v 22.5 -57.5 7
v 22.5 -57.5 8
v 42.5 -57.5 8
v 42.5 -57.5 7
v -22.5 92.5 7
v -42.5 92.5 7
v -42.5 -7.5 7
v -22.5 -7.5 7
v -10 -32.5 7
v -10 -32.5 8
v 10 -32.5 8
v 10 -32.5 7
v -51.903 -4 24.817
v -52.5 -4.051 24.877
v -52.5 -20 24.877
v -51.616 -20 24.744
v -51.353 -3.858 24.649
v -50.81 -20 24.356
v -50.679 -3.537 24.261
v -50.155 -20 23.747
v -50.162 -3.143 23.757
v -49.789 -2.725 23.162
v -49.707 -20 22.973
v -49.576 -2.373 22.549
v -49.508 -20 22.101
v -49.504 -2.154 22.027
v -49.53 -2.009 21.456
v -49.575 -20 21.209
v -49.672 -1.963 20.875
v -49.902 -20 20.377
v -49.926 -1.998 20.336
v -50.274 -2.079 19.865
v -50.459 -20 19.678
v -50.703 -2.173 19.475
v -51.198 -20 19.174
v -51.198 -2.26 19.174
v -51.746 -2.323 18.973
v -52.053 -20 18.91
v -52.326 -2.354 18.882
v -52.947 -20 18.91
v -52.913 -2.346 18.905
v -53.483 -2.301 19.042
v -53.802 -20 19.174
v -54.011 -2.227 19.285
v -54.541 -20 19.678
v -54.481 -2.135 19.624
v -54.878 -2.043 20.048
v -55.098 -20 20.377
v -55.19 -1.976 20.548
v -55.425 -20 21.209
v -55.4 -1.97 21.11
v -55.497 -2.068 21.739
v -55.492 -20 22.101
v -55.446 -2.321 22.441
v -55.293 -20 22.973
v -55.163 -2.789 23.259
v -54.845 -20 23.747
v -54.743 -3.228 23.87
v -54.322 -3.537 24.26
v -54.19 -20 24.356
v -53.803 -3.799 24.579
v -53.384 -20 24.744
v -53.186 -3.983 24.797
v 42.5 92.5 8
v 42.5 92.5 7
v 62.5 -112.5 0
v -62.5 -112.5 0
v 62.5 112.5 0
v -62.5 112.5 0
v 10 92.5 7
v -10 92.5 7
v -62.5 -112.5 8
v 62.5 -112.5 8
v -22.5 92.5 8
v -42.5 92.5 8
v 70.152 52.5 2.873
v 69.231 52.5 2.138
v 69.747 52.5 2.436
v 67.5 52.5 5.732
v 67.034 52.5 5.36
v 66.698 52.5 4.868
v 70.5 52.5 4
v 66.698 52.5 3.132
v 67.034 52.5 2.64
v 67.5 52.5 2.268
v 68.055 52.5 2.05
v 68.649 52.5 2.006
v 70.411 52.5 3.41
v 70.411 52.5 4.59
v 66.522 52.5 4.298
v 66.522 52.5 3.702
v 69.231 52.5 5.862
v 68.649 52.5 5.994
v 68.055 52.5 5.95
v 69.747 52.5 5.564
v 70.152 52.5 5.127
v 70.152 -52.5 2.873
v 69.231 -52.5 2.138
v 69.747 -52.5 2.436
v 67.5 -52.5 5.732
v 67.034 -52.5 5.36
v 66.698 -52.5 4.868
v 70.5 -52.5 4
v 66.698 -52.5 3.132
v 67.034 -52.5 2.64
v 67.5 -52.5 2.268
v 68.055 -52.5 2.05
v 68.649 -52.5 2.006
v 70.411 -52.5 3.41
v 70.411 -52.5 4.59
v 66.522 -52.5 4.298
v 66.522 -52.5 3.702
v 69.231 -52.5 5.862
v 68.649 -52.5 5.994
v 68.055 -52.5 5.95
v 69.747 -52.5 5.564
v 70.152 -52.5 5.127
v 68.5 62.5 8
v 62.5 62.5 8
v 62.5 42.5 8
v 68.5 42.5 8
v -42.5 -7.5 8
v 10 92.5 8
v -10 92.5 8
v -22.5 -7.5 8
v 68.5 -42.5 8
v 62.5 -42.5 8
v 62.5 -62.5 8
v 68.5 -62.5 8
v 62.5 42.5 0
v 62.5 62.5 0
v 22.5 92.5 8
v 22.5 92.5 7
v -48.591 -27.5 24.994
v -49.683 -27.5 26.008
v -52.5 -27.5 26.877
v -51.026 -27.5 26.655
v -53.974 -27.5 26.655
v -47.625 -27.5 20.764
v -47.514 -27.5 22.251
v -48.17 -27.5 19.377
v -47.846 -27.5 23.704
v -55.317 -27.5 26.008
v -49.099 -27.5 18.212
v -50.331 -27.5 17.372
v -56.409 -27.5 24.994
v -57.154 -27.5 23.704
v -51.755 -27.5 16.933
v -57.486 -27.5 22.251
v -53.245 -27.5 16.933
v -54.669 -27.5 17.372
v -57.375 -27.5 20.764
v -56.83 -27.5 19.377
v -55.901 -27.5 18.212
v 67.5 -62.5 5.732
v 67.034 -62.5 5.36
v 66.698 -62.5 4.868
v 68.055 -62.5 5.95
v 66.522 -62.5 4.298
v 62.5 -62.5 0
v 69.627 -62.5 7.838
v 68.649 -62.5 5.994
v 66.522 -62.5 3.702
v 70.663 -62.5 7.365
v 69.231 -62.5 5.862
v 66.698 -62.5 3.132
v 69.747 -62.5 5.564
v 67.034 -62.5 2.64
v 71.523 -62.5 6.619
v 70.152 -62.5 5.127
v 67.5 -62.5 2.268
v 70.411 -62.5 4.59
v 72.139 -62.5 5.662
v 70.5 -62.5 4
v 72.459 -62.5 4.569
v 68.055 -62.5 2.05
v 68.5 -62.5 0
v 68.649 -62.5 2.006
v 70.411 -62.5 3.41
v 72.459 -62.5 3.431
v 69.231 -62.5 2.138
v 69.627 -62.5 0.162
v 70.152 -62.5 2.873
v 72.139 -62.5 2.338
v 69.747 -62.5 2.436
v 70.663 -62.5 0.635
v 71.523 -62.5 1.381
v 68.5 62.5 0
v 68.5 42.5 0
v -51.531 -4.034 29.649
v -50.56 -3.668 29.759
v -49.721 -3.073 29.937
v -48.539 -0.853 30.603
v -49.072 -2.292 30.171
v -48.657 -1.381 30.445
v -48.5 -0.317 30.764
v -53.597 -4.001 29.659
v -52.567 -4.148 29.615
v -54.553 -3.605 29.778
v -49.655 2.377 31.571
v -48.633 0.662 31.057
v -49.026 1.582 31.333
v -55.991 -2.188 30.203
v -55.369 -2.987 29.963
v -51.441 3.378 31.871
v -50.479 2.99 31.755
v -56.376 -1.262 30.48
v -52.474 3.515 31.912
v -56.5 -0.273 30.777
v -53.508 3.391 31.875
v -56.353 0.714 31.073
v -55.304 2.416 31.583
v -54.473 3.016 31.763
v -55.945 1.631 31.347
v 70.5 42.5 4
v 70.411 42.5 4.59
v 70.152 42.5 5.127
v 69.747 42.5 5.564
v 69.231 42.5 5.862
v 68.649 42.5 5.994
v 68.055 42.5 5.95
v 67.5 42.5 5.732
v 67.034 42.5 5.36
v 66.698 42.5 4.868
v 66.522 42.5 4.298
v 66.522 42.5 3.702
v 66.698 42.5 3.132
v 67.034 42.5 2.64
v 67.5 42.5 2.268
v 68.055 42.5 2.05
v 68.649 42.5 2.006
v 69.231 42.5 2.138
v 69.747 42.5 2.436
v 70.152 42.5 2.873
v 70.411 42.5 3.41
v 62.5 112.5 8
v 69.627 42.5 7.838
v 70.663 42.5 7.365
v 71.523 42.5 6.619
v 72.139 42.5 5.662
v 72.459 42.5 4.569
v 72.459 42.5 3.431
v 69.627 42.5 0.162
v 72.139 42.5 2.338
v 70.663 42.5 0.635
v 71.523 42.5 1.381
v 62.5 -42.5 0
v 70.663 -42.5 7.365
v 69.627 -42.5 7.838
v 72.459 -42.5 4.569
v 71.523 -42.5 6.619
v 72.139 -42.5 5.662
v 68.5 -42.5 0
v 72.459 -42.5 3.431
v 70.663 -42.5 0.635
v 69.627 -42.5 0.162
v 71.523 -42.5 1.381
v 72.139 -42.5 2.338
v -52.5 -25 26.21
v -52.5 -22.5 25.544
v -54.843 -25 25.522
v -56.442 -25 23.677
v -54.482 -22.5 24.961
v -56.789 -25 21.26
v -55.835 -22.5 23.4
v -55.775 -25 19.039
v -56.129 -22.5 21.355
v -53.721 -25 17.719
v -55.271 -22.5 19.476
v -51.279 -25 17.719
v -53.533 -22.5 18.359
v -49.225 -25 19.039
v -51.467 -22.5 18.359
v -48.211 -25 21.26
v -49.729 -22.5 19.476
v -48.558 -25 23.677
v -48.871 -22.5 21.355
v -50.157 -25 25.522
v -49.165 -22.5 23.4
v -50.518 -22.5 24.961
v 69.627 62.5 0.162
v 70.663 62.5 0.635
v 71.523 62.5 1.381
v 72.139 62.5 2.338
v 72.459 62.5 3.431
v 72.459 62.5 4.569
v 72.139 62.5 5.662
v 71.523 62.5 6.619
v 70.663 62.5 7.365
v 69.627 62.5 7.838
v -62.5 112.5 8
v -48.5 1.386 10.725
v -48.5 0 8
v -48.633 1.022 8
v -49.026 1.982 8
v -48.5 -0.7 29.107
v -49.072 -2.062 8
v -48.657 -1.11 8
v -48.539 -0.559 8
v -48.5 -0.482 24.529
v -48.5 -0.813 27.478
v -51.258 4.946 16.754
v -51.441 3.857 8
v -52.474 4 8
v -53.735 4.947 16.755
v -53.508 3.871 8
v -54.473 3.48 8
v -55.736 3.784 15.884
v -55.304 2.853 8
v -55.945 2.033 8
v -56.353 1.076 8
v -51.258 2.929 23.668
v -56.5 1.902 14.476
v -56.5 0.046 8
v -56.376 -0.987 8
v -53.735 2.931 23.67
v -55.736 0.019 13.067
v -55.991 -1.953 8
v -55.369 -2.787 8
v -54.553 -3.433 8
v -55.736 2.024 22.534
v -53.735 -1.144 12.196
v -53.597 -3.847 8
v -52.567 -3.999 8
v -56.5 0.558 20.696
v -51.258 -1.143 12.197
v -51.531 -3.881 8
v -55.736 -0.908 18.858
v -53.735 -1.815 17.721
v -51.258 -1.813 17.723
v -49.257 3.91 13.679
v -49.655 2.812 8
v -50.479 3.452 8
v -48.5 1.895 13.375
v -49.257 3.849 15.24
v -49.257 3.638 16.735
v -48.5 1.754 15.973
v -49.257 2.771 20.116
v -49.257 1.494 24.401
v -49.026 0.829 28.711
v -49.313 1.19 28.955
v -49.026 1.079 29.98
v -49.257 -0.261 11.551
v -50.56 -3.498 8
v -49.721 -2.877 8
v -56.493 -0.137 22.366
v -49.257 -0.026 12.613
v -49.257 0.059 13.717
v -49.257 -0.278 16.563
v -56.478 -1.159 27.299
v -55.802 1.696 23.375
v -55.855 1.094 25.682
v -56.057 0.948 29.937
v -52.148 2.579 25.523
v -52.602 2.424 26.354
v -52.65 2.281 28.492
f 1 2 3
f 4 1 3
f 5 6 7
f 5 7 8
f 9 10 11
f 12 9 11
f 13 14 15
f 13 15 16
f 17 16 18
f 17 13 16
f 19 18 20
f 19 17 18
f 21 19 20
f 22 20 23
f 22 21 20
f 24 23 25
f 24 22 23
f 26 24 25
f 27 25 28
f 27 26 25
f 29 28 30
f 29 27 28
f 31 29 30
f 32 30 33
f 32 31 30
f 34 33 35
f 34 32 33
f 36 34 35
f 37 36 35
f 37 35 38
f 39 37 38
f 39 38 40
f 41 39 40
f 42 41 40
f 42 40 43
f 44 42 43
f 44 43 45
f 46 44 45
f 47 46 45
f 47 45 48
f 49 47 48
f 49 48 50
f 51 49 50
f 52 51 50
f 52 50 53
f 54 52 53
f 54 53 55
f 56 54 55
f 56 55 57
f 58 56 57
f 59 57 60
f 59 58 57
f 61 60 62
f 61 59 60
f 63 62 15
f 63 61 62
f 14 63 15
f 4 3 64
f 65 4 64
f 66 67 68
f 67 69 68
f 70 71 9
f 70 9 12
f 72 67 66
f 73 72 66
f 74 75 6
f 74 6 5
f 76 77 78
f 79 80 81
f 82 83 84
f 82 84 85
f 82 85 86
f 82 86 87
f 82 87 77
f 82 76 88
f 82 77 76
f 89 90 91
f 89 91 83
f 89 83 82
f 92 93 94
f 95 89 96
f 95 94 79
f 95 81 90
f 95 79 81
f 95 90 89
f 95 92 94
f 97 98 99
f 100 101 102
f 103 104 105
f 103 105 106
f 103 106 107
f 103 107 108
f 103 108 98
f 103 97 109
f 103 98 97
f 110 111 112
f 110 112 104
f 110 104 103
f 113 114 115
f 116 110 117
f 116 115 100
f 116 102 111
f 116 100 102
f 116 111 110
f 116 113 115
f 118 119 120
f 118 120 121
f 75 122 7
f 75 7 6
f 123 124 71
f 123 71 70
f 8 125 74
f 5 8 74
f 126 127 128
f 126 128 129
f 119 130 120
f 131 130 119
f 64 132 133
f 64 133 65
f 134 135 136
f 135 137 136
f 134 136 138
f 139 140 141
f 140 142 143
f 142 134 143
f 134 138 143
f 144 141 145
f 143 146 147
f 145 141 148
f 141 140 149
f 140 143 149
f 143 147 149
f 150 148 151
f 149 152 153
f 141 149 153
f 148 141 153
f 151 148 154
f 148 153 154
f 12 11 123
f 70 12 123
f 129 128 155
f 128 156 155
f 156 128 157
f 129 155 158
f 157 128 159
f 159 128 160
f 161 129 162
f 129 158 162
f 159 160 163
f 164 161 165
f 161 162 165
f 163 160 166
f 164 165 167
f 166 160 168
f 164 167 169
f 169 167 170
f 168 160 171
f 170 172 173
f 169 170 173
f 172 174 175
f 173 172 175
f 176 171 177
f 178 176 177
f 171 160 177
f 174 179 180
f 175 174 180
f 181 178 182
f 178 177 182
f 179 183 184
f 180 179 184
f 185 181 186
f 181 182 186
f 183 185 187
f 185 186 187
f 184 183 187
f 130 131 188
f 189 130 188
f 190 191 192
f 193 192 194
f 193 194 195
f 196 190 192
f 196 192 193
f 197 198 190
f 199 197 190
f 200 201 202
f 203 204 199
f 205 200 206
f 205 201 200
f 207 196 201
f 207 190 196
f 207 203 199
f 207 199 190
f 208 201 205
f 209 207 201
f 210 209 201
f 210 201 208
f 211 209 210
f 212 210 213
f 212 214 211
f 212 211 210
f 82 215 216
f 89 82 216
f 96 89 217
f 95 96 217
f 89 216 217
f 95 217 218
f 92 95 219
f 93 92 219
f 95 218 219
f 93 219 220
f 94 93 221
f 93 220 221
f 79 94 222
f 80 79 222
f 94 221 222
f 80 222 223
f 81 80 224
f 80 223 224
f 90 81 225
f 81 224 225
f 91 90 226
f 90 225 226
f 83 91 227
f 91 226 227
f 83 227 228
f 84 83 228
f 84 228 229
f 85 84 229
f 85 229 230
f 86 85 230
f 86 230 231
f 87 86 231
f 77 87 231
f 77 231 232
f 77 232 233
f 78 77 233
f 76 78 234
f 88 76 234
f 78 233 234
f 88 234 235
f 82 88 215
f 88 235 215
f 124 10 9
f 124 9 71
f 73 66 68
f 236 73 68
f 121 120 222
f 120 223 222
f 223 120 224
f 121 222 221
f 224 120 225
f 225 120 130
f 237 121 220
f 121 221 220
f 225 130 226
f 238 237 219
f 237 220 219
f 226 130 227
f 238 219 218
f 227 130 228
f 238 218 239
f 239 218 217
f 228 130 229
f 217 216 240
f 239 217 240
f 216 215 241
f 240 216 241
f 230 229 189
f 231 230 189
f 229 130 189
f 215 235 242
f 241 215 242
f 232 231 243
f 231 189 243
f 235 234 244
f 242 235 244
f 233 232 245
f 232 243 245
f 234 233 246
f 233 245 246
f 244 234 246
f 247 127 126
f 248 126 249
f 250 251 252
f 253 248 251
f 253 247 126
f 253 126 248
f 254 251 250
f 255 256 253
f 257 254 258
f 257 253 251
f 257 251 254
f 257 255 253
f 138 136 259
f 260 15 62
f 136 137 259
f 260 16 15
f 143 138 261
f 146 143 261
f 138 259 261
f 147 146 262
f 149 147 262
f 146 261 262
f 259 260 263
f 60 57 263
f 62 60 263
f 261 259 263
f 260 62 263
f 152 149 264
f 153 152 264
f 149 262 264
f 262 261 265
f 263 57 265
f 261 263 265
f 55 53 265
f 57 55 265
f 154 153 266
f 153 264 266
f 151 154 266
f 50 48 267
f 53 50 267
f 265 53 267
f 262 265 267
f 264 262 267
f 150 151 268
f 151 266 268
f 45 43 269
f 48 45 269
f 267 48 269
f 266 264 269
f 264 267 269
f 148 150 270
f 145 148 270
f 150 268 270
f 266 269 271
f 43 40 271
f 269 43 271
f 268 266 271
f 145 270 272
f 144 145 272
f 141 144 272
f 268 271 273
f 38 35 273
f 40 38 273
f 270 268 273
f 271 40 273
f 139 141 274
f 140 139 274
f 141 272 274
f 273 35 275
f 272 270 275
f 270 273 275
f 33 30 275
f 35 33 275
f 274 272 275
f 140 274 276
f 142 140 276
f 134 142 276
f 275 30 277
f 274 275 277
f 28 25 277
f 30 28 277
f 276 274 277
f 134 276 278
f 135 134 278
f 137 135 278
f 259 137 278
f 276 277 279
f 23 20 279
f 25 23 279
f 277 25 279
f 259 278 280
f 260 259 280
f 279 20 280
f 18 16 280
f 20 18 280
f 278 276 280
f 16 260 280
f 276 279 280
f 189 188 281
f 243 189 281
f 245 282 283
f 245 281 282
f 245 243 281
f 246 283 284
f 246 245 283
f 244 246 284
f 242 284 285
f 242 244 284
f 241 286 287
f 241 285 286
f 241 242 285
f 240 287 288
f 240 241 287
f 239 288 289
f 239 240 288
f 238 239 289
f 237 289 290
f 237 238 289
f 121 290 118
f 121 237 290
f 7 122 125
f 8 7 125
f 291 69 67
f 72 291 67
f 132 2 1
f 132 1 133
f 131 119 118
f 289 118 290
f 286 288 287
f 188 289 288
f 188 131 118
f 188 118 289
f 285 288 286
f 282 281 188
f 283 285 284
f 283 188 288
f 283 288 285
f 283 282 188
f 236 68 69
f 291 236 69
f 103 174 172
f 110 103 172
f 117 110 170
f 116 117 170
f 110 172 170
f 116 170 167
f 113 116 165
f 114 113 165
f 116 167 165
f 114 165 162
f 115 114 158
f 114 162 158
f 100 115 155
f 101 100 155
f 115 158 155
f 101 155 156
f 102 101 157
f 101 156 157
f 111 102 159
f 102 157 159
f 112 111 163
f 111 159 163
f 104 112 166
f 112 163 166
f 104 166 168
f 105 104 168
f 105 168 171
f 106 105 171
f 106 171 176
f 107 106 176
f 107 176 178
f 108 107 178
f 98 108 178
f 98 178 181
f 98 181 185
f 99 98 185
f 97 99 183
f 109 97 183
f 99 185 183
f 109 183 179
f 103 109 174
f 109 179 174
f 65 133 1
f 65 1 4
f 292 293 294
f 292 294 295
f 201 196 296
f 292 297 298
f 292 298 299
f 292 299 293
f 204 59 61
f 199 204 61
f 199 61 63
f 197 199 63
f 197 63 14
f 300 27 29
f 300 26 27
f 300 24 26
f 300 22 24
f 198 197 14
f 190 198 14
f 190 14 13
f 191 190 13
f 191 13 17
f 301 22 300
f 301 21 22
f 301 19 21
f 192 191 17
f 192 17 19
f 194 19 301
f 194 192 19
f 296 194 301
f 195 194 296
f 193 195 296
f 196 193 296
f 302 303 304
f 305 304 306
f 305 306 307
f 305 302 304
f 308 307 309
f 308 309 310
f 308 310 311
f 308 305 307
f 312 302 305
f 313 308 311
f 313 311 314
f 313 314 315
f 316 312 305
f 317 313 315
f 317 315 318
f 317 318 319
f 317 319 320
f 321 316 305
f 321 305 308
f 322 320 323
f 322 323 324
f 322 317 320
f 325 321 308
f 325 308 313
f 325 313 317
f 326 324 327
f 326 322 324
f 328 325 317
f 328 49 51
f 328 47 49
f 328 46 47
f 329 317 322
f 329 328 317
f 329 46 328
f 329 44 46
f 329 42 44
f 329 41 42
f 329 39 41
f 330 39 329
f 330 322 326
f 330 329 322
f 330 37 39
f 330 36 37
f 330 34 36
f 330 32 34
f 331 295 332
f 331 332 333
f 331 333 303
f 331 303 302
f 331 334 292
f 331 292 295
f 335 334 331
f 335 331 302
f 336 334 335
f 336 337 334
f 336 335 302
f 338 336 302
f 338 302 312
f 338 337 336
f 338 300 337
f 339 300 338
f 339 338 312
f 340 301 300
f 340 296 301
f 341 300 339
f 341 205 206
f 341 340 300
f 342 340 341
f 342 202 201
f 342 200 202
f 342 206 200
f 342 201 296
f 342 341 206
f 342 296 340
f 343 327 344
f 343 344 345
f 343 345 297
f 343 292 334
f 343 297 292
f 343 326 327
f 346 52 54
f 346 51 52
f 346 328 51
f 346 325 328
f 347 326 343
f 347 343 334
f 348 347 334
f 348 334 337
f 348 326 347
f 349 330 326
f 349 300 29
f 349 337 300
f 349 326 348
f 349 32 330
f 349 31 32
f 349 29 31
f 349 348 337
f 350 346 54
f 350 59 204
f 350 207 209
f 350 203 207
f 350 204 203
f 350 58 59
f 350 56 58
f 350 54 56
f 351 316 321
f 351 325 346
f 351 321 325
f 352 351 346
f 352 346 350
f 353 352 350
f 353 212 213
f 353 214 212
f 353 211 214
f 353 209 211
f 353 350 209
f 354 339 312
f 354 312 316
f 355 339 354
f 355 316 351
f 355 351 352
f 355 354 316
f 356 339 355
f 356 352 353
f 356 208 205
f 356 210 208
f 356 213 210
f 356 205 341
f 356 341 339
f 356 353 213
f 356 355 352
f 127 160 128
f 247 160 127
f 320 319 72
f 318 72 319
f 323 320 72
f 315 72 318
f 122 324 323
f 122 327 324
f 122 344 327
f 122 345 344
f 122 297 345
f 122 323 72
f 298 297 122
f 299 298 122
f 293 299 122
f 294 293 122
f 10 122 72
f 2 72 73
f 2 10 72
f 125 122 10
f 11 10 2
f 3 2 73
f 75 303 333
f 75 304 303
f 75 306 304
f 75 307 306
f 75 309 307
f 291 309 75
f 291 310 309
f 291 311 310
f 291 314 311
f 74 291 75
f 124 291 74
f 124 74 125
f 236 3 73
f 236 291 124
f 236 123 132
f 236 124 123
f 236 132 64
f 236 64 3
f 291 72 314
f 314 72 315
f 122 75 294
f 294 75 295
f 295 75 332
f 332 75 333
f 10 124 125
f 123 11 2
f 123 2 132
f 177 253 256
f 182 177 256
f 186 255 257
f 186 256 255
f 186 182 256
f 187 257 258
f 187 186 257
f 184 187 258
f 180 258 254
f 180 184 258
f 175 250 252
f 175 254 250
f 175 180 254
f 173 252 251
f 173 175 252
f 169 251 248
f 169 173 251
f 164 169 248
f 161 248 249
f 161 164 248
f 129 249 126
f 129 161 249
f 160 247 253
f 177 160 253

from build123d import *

# Parameters (mm, degrees)
SALIENTE_EXTRUIR1_DEPTH   = 8
CROQUIS17_W               = 10
CROQUIS17_H               = 20
SALIENTE_EXTRUIR3_DEPTH   = 8
SALIENTE_EXTRUIR3_2_DEPTH = 8
REDONDEO1_RADIUS          = 4
REDONDEO1_LENGTH          = 20
REDONDEO2_RADIUS          = 4
REDONDEO2_LENGTH          = 20
CROQUIS18_R               = 2
CORTAR_EXTRUIR2_DEPTH     = 10
CROQUIS19_R               = 2
CORTAR_EXTRUIR3_DEPTH     = 10
CROQUIS20_W               = 20
CROQUIS20_H               = 100
CROQUIS20_H_2             = 125
CROQUIS20_H_3             = 150
CORTAR_EXTRUIR4_DEPTH     = 1
CROQUIS22_R               = 4
CROQUIS25_R               = 3
SALIENTE_EXTRUIR4_DEPTH   = 20


with BuildPart() as part:
    # Croquis15 → Saliente-Extruir1 (new body)
    with BuildSketch(Plane.XY):
        Polygon((-62.5, -112.5), (62.5, -112.5), (62.5, -62.5), (62.5, -42.5), (62.5, 112.5), (-62.5, 112.5), align=None)
    extrude(amount=SALIENTE_EXTRUIR1_DEPTH)

    # Croquis20 → Cortar-Extruir4 (cut)
    with BuildSketch(Plane.XY.offset(8)):
        with Locations((-32.5, 42.5)):
            Rectangle(CROQUIS20_W, CROQUIS20_H)
        with Locations((0, 30)):
            Rectangle(CROQUIS20_W, CROQUIS20_H_2)
        with Locations((32.5, 17.5)):
            Rectangle(CROQUIS20_W, CROQUIS20_H_3)
    extrude(amount=-CORTAR_EXTRUIR4_DEPTH, mode=Mode.SUBTRACT)

    # Barrer1: sweep along a path in Croquis23
    with BuildLine() as barrer1_path:  # in the path sketch's own coordinates; laid on its plane below (add() does not lay a ready-made edge on the line's plane)
        add(Edge.make_bspline(
            [(8, 0), (16.008022833, 5.494506699), (22.815687146, -2.863995284), (30.763531117, -0.316827761)],
            knots=[0, 0, 0, 0, 1, 1, 1, 1], degree=3))
    # Croquis22 → Barrer1 (sweep)
    with BuildSketch(Plane.XY.offset(8)):
        with Locations((-52.5, 0)):
            Circle(CROQUIS22_R)
    sweep(path=Plane.ZY.offset(52.5) * barrer1_path.line)

    # Croquis25 → Saliente-Extruir4 (add)
    with BuildSketch(Plane(origin=(0, 0, 0), x_dir=(1, 0, 0), z_dir=(0, 1, 0))):
        with Locations(Location((-52.5, -21.876851305, 0), (0, 0, 270))):
            Circle(CROQUIS25_R)
    extrude(amount=-SALIENTE_EXTRUIR4_DEPTH)

    # Croquis26 → Revolución2 (revolve)
    with BuildSketch(Plane.ZY.offset(52.5)):
        Polygon((21.876851305, -20), (21.876851305, -27.5), (26.876851305, -27.5), (24.876851305, -20), align=None)
    revolve(axis=Axis((-52.5, -20, 21.876851305), (0, -1, 0)))


with BuildPart() as body_2:
    # Croquis17 → Saliente-Extruir3 (new body)
    with BuildSketch(Plane.XY):
        with Locations((67.5, 52.5)):
            Rectangle(CROQUIS17_W, CROQUIS17_H)
    extrude(amount=SALIENTE_EXTRUIR3_DEPTH)

    # Redondeo1: full round fillet: the end face becomes a half cylinder, R = half its width
    redondeo1_face = Plane((72.5, 52.5, 4), x_dir=(0, -1, 0), z_dir=(1, 0, 0))  # on the end face: x along it, z out of the body
    redondeo1_slab = redondeo1_face.offset(-REDONDEO1_RADIUS / 2) * Box(REDONDEO1_LENGTH, 2 * REDONDEO1_RADIUS, REDONDEO1_RADIUS, mode=Mode.PRIVATE)  # the body's end, R deep
    redondeo1_round = Plane((68.5, 52.5, 4), x_dir=(1, 0, 0), z_dir=(0, -1, 0)) * Cylinder(REDONDEO1_RADIUS, REDONDEO1_LENGTH, mode=Mode.PRIVATE)  # its axis R under the face
    add(redondeo1_slab - redondeo1_round, mode=Mode.SUBTRACT)

    # Croquis19 → Cortar-Extruir3 (cut)
    with BuildSketch(Plane.XZ.offset(-42.5)):
        with Locations((68.5, 4)):
            Circle(CROQUIS19_R)
    extrude(amount=-CORTAR_EXTRUIR3_DEPTH, mode=Mode.SUBTRACT)


with BuildPart() as body_3:
    # Croquis17 → Saliente-Extruir3 2 (new body)
    with BuildSketch(Plane.XY):
        with Locations((67.5, -52.5)):
            Rectangle(CROQUIS17_W, CROQUIS17_H)
    extrude(amount=SALIENTE_EXTRUIR3_2_DEPTH)

    # Redondeo2: full round fillet: the end face becomes a half cylinder, R = half its width
    redondeo2_face = Plane((72.5, -52.5, 4), x_dir=(0, -1, 0), z_dir=(1, 0, 0))  # on the end face: x along it, z out of the body
    redondeo2_slab = redondeo2_face.offset(-REDONDEO2_RADIUS / 2) * Box(REDONDEO2_LENGTH, 2 * REDONDEO2_RADIUS, REDONDEO2_RADIUS, mode=Mode.PRIVATE)  # the body's end, R deep
    redondeo2_round = Plane((68.5, -52.5, 4), x_dir=(1, 0, 0), z_dir=(0, -1, 0)) * Cylinder(REDONDEO2_RADIUS, REDONDEO2_LENGTH, mode=Mode.PRIVATE)  # its axis R under the face
    add(redondeo2_slab - redondeo2_round, mode=Mode.SUBTRACT)

    # Croquis18 → Cortar-Extruir2 (cut)
    with BuildSketch(Plane.XZ.offset(62.5)):
        with Locations((68.5, 4)):
            Circle(CROQUIS18_R)
    extrude(amount=-CORTAR_EXTRUIR2_DEPTH, mode=Mode.SUBTRACT)


solid = Compound([part.part, body_2.part, body_3.part])
